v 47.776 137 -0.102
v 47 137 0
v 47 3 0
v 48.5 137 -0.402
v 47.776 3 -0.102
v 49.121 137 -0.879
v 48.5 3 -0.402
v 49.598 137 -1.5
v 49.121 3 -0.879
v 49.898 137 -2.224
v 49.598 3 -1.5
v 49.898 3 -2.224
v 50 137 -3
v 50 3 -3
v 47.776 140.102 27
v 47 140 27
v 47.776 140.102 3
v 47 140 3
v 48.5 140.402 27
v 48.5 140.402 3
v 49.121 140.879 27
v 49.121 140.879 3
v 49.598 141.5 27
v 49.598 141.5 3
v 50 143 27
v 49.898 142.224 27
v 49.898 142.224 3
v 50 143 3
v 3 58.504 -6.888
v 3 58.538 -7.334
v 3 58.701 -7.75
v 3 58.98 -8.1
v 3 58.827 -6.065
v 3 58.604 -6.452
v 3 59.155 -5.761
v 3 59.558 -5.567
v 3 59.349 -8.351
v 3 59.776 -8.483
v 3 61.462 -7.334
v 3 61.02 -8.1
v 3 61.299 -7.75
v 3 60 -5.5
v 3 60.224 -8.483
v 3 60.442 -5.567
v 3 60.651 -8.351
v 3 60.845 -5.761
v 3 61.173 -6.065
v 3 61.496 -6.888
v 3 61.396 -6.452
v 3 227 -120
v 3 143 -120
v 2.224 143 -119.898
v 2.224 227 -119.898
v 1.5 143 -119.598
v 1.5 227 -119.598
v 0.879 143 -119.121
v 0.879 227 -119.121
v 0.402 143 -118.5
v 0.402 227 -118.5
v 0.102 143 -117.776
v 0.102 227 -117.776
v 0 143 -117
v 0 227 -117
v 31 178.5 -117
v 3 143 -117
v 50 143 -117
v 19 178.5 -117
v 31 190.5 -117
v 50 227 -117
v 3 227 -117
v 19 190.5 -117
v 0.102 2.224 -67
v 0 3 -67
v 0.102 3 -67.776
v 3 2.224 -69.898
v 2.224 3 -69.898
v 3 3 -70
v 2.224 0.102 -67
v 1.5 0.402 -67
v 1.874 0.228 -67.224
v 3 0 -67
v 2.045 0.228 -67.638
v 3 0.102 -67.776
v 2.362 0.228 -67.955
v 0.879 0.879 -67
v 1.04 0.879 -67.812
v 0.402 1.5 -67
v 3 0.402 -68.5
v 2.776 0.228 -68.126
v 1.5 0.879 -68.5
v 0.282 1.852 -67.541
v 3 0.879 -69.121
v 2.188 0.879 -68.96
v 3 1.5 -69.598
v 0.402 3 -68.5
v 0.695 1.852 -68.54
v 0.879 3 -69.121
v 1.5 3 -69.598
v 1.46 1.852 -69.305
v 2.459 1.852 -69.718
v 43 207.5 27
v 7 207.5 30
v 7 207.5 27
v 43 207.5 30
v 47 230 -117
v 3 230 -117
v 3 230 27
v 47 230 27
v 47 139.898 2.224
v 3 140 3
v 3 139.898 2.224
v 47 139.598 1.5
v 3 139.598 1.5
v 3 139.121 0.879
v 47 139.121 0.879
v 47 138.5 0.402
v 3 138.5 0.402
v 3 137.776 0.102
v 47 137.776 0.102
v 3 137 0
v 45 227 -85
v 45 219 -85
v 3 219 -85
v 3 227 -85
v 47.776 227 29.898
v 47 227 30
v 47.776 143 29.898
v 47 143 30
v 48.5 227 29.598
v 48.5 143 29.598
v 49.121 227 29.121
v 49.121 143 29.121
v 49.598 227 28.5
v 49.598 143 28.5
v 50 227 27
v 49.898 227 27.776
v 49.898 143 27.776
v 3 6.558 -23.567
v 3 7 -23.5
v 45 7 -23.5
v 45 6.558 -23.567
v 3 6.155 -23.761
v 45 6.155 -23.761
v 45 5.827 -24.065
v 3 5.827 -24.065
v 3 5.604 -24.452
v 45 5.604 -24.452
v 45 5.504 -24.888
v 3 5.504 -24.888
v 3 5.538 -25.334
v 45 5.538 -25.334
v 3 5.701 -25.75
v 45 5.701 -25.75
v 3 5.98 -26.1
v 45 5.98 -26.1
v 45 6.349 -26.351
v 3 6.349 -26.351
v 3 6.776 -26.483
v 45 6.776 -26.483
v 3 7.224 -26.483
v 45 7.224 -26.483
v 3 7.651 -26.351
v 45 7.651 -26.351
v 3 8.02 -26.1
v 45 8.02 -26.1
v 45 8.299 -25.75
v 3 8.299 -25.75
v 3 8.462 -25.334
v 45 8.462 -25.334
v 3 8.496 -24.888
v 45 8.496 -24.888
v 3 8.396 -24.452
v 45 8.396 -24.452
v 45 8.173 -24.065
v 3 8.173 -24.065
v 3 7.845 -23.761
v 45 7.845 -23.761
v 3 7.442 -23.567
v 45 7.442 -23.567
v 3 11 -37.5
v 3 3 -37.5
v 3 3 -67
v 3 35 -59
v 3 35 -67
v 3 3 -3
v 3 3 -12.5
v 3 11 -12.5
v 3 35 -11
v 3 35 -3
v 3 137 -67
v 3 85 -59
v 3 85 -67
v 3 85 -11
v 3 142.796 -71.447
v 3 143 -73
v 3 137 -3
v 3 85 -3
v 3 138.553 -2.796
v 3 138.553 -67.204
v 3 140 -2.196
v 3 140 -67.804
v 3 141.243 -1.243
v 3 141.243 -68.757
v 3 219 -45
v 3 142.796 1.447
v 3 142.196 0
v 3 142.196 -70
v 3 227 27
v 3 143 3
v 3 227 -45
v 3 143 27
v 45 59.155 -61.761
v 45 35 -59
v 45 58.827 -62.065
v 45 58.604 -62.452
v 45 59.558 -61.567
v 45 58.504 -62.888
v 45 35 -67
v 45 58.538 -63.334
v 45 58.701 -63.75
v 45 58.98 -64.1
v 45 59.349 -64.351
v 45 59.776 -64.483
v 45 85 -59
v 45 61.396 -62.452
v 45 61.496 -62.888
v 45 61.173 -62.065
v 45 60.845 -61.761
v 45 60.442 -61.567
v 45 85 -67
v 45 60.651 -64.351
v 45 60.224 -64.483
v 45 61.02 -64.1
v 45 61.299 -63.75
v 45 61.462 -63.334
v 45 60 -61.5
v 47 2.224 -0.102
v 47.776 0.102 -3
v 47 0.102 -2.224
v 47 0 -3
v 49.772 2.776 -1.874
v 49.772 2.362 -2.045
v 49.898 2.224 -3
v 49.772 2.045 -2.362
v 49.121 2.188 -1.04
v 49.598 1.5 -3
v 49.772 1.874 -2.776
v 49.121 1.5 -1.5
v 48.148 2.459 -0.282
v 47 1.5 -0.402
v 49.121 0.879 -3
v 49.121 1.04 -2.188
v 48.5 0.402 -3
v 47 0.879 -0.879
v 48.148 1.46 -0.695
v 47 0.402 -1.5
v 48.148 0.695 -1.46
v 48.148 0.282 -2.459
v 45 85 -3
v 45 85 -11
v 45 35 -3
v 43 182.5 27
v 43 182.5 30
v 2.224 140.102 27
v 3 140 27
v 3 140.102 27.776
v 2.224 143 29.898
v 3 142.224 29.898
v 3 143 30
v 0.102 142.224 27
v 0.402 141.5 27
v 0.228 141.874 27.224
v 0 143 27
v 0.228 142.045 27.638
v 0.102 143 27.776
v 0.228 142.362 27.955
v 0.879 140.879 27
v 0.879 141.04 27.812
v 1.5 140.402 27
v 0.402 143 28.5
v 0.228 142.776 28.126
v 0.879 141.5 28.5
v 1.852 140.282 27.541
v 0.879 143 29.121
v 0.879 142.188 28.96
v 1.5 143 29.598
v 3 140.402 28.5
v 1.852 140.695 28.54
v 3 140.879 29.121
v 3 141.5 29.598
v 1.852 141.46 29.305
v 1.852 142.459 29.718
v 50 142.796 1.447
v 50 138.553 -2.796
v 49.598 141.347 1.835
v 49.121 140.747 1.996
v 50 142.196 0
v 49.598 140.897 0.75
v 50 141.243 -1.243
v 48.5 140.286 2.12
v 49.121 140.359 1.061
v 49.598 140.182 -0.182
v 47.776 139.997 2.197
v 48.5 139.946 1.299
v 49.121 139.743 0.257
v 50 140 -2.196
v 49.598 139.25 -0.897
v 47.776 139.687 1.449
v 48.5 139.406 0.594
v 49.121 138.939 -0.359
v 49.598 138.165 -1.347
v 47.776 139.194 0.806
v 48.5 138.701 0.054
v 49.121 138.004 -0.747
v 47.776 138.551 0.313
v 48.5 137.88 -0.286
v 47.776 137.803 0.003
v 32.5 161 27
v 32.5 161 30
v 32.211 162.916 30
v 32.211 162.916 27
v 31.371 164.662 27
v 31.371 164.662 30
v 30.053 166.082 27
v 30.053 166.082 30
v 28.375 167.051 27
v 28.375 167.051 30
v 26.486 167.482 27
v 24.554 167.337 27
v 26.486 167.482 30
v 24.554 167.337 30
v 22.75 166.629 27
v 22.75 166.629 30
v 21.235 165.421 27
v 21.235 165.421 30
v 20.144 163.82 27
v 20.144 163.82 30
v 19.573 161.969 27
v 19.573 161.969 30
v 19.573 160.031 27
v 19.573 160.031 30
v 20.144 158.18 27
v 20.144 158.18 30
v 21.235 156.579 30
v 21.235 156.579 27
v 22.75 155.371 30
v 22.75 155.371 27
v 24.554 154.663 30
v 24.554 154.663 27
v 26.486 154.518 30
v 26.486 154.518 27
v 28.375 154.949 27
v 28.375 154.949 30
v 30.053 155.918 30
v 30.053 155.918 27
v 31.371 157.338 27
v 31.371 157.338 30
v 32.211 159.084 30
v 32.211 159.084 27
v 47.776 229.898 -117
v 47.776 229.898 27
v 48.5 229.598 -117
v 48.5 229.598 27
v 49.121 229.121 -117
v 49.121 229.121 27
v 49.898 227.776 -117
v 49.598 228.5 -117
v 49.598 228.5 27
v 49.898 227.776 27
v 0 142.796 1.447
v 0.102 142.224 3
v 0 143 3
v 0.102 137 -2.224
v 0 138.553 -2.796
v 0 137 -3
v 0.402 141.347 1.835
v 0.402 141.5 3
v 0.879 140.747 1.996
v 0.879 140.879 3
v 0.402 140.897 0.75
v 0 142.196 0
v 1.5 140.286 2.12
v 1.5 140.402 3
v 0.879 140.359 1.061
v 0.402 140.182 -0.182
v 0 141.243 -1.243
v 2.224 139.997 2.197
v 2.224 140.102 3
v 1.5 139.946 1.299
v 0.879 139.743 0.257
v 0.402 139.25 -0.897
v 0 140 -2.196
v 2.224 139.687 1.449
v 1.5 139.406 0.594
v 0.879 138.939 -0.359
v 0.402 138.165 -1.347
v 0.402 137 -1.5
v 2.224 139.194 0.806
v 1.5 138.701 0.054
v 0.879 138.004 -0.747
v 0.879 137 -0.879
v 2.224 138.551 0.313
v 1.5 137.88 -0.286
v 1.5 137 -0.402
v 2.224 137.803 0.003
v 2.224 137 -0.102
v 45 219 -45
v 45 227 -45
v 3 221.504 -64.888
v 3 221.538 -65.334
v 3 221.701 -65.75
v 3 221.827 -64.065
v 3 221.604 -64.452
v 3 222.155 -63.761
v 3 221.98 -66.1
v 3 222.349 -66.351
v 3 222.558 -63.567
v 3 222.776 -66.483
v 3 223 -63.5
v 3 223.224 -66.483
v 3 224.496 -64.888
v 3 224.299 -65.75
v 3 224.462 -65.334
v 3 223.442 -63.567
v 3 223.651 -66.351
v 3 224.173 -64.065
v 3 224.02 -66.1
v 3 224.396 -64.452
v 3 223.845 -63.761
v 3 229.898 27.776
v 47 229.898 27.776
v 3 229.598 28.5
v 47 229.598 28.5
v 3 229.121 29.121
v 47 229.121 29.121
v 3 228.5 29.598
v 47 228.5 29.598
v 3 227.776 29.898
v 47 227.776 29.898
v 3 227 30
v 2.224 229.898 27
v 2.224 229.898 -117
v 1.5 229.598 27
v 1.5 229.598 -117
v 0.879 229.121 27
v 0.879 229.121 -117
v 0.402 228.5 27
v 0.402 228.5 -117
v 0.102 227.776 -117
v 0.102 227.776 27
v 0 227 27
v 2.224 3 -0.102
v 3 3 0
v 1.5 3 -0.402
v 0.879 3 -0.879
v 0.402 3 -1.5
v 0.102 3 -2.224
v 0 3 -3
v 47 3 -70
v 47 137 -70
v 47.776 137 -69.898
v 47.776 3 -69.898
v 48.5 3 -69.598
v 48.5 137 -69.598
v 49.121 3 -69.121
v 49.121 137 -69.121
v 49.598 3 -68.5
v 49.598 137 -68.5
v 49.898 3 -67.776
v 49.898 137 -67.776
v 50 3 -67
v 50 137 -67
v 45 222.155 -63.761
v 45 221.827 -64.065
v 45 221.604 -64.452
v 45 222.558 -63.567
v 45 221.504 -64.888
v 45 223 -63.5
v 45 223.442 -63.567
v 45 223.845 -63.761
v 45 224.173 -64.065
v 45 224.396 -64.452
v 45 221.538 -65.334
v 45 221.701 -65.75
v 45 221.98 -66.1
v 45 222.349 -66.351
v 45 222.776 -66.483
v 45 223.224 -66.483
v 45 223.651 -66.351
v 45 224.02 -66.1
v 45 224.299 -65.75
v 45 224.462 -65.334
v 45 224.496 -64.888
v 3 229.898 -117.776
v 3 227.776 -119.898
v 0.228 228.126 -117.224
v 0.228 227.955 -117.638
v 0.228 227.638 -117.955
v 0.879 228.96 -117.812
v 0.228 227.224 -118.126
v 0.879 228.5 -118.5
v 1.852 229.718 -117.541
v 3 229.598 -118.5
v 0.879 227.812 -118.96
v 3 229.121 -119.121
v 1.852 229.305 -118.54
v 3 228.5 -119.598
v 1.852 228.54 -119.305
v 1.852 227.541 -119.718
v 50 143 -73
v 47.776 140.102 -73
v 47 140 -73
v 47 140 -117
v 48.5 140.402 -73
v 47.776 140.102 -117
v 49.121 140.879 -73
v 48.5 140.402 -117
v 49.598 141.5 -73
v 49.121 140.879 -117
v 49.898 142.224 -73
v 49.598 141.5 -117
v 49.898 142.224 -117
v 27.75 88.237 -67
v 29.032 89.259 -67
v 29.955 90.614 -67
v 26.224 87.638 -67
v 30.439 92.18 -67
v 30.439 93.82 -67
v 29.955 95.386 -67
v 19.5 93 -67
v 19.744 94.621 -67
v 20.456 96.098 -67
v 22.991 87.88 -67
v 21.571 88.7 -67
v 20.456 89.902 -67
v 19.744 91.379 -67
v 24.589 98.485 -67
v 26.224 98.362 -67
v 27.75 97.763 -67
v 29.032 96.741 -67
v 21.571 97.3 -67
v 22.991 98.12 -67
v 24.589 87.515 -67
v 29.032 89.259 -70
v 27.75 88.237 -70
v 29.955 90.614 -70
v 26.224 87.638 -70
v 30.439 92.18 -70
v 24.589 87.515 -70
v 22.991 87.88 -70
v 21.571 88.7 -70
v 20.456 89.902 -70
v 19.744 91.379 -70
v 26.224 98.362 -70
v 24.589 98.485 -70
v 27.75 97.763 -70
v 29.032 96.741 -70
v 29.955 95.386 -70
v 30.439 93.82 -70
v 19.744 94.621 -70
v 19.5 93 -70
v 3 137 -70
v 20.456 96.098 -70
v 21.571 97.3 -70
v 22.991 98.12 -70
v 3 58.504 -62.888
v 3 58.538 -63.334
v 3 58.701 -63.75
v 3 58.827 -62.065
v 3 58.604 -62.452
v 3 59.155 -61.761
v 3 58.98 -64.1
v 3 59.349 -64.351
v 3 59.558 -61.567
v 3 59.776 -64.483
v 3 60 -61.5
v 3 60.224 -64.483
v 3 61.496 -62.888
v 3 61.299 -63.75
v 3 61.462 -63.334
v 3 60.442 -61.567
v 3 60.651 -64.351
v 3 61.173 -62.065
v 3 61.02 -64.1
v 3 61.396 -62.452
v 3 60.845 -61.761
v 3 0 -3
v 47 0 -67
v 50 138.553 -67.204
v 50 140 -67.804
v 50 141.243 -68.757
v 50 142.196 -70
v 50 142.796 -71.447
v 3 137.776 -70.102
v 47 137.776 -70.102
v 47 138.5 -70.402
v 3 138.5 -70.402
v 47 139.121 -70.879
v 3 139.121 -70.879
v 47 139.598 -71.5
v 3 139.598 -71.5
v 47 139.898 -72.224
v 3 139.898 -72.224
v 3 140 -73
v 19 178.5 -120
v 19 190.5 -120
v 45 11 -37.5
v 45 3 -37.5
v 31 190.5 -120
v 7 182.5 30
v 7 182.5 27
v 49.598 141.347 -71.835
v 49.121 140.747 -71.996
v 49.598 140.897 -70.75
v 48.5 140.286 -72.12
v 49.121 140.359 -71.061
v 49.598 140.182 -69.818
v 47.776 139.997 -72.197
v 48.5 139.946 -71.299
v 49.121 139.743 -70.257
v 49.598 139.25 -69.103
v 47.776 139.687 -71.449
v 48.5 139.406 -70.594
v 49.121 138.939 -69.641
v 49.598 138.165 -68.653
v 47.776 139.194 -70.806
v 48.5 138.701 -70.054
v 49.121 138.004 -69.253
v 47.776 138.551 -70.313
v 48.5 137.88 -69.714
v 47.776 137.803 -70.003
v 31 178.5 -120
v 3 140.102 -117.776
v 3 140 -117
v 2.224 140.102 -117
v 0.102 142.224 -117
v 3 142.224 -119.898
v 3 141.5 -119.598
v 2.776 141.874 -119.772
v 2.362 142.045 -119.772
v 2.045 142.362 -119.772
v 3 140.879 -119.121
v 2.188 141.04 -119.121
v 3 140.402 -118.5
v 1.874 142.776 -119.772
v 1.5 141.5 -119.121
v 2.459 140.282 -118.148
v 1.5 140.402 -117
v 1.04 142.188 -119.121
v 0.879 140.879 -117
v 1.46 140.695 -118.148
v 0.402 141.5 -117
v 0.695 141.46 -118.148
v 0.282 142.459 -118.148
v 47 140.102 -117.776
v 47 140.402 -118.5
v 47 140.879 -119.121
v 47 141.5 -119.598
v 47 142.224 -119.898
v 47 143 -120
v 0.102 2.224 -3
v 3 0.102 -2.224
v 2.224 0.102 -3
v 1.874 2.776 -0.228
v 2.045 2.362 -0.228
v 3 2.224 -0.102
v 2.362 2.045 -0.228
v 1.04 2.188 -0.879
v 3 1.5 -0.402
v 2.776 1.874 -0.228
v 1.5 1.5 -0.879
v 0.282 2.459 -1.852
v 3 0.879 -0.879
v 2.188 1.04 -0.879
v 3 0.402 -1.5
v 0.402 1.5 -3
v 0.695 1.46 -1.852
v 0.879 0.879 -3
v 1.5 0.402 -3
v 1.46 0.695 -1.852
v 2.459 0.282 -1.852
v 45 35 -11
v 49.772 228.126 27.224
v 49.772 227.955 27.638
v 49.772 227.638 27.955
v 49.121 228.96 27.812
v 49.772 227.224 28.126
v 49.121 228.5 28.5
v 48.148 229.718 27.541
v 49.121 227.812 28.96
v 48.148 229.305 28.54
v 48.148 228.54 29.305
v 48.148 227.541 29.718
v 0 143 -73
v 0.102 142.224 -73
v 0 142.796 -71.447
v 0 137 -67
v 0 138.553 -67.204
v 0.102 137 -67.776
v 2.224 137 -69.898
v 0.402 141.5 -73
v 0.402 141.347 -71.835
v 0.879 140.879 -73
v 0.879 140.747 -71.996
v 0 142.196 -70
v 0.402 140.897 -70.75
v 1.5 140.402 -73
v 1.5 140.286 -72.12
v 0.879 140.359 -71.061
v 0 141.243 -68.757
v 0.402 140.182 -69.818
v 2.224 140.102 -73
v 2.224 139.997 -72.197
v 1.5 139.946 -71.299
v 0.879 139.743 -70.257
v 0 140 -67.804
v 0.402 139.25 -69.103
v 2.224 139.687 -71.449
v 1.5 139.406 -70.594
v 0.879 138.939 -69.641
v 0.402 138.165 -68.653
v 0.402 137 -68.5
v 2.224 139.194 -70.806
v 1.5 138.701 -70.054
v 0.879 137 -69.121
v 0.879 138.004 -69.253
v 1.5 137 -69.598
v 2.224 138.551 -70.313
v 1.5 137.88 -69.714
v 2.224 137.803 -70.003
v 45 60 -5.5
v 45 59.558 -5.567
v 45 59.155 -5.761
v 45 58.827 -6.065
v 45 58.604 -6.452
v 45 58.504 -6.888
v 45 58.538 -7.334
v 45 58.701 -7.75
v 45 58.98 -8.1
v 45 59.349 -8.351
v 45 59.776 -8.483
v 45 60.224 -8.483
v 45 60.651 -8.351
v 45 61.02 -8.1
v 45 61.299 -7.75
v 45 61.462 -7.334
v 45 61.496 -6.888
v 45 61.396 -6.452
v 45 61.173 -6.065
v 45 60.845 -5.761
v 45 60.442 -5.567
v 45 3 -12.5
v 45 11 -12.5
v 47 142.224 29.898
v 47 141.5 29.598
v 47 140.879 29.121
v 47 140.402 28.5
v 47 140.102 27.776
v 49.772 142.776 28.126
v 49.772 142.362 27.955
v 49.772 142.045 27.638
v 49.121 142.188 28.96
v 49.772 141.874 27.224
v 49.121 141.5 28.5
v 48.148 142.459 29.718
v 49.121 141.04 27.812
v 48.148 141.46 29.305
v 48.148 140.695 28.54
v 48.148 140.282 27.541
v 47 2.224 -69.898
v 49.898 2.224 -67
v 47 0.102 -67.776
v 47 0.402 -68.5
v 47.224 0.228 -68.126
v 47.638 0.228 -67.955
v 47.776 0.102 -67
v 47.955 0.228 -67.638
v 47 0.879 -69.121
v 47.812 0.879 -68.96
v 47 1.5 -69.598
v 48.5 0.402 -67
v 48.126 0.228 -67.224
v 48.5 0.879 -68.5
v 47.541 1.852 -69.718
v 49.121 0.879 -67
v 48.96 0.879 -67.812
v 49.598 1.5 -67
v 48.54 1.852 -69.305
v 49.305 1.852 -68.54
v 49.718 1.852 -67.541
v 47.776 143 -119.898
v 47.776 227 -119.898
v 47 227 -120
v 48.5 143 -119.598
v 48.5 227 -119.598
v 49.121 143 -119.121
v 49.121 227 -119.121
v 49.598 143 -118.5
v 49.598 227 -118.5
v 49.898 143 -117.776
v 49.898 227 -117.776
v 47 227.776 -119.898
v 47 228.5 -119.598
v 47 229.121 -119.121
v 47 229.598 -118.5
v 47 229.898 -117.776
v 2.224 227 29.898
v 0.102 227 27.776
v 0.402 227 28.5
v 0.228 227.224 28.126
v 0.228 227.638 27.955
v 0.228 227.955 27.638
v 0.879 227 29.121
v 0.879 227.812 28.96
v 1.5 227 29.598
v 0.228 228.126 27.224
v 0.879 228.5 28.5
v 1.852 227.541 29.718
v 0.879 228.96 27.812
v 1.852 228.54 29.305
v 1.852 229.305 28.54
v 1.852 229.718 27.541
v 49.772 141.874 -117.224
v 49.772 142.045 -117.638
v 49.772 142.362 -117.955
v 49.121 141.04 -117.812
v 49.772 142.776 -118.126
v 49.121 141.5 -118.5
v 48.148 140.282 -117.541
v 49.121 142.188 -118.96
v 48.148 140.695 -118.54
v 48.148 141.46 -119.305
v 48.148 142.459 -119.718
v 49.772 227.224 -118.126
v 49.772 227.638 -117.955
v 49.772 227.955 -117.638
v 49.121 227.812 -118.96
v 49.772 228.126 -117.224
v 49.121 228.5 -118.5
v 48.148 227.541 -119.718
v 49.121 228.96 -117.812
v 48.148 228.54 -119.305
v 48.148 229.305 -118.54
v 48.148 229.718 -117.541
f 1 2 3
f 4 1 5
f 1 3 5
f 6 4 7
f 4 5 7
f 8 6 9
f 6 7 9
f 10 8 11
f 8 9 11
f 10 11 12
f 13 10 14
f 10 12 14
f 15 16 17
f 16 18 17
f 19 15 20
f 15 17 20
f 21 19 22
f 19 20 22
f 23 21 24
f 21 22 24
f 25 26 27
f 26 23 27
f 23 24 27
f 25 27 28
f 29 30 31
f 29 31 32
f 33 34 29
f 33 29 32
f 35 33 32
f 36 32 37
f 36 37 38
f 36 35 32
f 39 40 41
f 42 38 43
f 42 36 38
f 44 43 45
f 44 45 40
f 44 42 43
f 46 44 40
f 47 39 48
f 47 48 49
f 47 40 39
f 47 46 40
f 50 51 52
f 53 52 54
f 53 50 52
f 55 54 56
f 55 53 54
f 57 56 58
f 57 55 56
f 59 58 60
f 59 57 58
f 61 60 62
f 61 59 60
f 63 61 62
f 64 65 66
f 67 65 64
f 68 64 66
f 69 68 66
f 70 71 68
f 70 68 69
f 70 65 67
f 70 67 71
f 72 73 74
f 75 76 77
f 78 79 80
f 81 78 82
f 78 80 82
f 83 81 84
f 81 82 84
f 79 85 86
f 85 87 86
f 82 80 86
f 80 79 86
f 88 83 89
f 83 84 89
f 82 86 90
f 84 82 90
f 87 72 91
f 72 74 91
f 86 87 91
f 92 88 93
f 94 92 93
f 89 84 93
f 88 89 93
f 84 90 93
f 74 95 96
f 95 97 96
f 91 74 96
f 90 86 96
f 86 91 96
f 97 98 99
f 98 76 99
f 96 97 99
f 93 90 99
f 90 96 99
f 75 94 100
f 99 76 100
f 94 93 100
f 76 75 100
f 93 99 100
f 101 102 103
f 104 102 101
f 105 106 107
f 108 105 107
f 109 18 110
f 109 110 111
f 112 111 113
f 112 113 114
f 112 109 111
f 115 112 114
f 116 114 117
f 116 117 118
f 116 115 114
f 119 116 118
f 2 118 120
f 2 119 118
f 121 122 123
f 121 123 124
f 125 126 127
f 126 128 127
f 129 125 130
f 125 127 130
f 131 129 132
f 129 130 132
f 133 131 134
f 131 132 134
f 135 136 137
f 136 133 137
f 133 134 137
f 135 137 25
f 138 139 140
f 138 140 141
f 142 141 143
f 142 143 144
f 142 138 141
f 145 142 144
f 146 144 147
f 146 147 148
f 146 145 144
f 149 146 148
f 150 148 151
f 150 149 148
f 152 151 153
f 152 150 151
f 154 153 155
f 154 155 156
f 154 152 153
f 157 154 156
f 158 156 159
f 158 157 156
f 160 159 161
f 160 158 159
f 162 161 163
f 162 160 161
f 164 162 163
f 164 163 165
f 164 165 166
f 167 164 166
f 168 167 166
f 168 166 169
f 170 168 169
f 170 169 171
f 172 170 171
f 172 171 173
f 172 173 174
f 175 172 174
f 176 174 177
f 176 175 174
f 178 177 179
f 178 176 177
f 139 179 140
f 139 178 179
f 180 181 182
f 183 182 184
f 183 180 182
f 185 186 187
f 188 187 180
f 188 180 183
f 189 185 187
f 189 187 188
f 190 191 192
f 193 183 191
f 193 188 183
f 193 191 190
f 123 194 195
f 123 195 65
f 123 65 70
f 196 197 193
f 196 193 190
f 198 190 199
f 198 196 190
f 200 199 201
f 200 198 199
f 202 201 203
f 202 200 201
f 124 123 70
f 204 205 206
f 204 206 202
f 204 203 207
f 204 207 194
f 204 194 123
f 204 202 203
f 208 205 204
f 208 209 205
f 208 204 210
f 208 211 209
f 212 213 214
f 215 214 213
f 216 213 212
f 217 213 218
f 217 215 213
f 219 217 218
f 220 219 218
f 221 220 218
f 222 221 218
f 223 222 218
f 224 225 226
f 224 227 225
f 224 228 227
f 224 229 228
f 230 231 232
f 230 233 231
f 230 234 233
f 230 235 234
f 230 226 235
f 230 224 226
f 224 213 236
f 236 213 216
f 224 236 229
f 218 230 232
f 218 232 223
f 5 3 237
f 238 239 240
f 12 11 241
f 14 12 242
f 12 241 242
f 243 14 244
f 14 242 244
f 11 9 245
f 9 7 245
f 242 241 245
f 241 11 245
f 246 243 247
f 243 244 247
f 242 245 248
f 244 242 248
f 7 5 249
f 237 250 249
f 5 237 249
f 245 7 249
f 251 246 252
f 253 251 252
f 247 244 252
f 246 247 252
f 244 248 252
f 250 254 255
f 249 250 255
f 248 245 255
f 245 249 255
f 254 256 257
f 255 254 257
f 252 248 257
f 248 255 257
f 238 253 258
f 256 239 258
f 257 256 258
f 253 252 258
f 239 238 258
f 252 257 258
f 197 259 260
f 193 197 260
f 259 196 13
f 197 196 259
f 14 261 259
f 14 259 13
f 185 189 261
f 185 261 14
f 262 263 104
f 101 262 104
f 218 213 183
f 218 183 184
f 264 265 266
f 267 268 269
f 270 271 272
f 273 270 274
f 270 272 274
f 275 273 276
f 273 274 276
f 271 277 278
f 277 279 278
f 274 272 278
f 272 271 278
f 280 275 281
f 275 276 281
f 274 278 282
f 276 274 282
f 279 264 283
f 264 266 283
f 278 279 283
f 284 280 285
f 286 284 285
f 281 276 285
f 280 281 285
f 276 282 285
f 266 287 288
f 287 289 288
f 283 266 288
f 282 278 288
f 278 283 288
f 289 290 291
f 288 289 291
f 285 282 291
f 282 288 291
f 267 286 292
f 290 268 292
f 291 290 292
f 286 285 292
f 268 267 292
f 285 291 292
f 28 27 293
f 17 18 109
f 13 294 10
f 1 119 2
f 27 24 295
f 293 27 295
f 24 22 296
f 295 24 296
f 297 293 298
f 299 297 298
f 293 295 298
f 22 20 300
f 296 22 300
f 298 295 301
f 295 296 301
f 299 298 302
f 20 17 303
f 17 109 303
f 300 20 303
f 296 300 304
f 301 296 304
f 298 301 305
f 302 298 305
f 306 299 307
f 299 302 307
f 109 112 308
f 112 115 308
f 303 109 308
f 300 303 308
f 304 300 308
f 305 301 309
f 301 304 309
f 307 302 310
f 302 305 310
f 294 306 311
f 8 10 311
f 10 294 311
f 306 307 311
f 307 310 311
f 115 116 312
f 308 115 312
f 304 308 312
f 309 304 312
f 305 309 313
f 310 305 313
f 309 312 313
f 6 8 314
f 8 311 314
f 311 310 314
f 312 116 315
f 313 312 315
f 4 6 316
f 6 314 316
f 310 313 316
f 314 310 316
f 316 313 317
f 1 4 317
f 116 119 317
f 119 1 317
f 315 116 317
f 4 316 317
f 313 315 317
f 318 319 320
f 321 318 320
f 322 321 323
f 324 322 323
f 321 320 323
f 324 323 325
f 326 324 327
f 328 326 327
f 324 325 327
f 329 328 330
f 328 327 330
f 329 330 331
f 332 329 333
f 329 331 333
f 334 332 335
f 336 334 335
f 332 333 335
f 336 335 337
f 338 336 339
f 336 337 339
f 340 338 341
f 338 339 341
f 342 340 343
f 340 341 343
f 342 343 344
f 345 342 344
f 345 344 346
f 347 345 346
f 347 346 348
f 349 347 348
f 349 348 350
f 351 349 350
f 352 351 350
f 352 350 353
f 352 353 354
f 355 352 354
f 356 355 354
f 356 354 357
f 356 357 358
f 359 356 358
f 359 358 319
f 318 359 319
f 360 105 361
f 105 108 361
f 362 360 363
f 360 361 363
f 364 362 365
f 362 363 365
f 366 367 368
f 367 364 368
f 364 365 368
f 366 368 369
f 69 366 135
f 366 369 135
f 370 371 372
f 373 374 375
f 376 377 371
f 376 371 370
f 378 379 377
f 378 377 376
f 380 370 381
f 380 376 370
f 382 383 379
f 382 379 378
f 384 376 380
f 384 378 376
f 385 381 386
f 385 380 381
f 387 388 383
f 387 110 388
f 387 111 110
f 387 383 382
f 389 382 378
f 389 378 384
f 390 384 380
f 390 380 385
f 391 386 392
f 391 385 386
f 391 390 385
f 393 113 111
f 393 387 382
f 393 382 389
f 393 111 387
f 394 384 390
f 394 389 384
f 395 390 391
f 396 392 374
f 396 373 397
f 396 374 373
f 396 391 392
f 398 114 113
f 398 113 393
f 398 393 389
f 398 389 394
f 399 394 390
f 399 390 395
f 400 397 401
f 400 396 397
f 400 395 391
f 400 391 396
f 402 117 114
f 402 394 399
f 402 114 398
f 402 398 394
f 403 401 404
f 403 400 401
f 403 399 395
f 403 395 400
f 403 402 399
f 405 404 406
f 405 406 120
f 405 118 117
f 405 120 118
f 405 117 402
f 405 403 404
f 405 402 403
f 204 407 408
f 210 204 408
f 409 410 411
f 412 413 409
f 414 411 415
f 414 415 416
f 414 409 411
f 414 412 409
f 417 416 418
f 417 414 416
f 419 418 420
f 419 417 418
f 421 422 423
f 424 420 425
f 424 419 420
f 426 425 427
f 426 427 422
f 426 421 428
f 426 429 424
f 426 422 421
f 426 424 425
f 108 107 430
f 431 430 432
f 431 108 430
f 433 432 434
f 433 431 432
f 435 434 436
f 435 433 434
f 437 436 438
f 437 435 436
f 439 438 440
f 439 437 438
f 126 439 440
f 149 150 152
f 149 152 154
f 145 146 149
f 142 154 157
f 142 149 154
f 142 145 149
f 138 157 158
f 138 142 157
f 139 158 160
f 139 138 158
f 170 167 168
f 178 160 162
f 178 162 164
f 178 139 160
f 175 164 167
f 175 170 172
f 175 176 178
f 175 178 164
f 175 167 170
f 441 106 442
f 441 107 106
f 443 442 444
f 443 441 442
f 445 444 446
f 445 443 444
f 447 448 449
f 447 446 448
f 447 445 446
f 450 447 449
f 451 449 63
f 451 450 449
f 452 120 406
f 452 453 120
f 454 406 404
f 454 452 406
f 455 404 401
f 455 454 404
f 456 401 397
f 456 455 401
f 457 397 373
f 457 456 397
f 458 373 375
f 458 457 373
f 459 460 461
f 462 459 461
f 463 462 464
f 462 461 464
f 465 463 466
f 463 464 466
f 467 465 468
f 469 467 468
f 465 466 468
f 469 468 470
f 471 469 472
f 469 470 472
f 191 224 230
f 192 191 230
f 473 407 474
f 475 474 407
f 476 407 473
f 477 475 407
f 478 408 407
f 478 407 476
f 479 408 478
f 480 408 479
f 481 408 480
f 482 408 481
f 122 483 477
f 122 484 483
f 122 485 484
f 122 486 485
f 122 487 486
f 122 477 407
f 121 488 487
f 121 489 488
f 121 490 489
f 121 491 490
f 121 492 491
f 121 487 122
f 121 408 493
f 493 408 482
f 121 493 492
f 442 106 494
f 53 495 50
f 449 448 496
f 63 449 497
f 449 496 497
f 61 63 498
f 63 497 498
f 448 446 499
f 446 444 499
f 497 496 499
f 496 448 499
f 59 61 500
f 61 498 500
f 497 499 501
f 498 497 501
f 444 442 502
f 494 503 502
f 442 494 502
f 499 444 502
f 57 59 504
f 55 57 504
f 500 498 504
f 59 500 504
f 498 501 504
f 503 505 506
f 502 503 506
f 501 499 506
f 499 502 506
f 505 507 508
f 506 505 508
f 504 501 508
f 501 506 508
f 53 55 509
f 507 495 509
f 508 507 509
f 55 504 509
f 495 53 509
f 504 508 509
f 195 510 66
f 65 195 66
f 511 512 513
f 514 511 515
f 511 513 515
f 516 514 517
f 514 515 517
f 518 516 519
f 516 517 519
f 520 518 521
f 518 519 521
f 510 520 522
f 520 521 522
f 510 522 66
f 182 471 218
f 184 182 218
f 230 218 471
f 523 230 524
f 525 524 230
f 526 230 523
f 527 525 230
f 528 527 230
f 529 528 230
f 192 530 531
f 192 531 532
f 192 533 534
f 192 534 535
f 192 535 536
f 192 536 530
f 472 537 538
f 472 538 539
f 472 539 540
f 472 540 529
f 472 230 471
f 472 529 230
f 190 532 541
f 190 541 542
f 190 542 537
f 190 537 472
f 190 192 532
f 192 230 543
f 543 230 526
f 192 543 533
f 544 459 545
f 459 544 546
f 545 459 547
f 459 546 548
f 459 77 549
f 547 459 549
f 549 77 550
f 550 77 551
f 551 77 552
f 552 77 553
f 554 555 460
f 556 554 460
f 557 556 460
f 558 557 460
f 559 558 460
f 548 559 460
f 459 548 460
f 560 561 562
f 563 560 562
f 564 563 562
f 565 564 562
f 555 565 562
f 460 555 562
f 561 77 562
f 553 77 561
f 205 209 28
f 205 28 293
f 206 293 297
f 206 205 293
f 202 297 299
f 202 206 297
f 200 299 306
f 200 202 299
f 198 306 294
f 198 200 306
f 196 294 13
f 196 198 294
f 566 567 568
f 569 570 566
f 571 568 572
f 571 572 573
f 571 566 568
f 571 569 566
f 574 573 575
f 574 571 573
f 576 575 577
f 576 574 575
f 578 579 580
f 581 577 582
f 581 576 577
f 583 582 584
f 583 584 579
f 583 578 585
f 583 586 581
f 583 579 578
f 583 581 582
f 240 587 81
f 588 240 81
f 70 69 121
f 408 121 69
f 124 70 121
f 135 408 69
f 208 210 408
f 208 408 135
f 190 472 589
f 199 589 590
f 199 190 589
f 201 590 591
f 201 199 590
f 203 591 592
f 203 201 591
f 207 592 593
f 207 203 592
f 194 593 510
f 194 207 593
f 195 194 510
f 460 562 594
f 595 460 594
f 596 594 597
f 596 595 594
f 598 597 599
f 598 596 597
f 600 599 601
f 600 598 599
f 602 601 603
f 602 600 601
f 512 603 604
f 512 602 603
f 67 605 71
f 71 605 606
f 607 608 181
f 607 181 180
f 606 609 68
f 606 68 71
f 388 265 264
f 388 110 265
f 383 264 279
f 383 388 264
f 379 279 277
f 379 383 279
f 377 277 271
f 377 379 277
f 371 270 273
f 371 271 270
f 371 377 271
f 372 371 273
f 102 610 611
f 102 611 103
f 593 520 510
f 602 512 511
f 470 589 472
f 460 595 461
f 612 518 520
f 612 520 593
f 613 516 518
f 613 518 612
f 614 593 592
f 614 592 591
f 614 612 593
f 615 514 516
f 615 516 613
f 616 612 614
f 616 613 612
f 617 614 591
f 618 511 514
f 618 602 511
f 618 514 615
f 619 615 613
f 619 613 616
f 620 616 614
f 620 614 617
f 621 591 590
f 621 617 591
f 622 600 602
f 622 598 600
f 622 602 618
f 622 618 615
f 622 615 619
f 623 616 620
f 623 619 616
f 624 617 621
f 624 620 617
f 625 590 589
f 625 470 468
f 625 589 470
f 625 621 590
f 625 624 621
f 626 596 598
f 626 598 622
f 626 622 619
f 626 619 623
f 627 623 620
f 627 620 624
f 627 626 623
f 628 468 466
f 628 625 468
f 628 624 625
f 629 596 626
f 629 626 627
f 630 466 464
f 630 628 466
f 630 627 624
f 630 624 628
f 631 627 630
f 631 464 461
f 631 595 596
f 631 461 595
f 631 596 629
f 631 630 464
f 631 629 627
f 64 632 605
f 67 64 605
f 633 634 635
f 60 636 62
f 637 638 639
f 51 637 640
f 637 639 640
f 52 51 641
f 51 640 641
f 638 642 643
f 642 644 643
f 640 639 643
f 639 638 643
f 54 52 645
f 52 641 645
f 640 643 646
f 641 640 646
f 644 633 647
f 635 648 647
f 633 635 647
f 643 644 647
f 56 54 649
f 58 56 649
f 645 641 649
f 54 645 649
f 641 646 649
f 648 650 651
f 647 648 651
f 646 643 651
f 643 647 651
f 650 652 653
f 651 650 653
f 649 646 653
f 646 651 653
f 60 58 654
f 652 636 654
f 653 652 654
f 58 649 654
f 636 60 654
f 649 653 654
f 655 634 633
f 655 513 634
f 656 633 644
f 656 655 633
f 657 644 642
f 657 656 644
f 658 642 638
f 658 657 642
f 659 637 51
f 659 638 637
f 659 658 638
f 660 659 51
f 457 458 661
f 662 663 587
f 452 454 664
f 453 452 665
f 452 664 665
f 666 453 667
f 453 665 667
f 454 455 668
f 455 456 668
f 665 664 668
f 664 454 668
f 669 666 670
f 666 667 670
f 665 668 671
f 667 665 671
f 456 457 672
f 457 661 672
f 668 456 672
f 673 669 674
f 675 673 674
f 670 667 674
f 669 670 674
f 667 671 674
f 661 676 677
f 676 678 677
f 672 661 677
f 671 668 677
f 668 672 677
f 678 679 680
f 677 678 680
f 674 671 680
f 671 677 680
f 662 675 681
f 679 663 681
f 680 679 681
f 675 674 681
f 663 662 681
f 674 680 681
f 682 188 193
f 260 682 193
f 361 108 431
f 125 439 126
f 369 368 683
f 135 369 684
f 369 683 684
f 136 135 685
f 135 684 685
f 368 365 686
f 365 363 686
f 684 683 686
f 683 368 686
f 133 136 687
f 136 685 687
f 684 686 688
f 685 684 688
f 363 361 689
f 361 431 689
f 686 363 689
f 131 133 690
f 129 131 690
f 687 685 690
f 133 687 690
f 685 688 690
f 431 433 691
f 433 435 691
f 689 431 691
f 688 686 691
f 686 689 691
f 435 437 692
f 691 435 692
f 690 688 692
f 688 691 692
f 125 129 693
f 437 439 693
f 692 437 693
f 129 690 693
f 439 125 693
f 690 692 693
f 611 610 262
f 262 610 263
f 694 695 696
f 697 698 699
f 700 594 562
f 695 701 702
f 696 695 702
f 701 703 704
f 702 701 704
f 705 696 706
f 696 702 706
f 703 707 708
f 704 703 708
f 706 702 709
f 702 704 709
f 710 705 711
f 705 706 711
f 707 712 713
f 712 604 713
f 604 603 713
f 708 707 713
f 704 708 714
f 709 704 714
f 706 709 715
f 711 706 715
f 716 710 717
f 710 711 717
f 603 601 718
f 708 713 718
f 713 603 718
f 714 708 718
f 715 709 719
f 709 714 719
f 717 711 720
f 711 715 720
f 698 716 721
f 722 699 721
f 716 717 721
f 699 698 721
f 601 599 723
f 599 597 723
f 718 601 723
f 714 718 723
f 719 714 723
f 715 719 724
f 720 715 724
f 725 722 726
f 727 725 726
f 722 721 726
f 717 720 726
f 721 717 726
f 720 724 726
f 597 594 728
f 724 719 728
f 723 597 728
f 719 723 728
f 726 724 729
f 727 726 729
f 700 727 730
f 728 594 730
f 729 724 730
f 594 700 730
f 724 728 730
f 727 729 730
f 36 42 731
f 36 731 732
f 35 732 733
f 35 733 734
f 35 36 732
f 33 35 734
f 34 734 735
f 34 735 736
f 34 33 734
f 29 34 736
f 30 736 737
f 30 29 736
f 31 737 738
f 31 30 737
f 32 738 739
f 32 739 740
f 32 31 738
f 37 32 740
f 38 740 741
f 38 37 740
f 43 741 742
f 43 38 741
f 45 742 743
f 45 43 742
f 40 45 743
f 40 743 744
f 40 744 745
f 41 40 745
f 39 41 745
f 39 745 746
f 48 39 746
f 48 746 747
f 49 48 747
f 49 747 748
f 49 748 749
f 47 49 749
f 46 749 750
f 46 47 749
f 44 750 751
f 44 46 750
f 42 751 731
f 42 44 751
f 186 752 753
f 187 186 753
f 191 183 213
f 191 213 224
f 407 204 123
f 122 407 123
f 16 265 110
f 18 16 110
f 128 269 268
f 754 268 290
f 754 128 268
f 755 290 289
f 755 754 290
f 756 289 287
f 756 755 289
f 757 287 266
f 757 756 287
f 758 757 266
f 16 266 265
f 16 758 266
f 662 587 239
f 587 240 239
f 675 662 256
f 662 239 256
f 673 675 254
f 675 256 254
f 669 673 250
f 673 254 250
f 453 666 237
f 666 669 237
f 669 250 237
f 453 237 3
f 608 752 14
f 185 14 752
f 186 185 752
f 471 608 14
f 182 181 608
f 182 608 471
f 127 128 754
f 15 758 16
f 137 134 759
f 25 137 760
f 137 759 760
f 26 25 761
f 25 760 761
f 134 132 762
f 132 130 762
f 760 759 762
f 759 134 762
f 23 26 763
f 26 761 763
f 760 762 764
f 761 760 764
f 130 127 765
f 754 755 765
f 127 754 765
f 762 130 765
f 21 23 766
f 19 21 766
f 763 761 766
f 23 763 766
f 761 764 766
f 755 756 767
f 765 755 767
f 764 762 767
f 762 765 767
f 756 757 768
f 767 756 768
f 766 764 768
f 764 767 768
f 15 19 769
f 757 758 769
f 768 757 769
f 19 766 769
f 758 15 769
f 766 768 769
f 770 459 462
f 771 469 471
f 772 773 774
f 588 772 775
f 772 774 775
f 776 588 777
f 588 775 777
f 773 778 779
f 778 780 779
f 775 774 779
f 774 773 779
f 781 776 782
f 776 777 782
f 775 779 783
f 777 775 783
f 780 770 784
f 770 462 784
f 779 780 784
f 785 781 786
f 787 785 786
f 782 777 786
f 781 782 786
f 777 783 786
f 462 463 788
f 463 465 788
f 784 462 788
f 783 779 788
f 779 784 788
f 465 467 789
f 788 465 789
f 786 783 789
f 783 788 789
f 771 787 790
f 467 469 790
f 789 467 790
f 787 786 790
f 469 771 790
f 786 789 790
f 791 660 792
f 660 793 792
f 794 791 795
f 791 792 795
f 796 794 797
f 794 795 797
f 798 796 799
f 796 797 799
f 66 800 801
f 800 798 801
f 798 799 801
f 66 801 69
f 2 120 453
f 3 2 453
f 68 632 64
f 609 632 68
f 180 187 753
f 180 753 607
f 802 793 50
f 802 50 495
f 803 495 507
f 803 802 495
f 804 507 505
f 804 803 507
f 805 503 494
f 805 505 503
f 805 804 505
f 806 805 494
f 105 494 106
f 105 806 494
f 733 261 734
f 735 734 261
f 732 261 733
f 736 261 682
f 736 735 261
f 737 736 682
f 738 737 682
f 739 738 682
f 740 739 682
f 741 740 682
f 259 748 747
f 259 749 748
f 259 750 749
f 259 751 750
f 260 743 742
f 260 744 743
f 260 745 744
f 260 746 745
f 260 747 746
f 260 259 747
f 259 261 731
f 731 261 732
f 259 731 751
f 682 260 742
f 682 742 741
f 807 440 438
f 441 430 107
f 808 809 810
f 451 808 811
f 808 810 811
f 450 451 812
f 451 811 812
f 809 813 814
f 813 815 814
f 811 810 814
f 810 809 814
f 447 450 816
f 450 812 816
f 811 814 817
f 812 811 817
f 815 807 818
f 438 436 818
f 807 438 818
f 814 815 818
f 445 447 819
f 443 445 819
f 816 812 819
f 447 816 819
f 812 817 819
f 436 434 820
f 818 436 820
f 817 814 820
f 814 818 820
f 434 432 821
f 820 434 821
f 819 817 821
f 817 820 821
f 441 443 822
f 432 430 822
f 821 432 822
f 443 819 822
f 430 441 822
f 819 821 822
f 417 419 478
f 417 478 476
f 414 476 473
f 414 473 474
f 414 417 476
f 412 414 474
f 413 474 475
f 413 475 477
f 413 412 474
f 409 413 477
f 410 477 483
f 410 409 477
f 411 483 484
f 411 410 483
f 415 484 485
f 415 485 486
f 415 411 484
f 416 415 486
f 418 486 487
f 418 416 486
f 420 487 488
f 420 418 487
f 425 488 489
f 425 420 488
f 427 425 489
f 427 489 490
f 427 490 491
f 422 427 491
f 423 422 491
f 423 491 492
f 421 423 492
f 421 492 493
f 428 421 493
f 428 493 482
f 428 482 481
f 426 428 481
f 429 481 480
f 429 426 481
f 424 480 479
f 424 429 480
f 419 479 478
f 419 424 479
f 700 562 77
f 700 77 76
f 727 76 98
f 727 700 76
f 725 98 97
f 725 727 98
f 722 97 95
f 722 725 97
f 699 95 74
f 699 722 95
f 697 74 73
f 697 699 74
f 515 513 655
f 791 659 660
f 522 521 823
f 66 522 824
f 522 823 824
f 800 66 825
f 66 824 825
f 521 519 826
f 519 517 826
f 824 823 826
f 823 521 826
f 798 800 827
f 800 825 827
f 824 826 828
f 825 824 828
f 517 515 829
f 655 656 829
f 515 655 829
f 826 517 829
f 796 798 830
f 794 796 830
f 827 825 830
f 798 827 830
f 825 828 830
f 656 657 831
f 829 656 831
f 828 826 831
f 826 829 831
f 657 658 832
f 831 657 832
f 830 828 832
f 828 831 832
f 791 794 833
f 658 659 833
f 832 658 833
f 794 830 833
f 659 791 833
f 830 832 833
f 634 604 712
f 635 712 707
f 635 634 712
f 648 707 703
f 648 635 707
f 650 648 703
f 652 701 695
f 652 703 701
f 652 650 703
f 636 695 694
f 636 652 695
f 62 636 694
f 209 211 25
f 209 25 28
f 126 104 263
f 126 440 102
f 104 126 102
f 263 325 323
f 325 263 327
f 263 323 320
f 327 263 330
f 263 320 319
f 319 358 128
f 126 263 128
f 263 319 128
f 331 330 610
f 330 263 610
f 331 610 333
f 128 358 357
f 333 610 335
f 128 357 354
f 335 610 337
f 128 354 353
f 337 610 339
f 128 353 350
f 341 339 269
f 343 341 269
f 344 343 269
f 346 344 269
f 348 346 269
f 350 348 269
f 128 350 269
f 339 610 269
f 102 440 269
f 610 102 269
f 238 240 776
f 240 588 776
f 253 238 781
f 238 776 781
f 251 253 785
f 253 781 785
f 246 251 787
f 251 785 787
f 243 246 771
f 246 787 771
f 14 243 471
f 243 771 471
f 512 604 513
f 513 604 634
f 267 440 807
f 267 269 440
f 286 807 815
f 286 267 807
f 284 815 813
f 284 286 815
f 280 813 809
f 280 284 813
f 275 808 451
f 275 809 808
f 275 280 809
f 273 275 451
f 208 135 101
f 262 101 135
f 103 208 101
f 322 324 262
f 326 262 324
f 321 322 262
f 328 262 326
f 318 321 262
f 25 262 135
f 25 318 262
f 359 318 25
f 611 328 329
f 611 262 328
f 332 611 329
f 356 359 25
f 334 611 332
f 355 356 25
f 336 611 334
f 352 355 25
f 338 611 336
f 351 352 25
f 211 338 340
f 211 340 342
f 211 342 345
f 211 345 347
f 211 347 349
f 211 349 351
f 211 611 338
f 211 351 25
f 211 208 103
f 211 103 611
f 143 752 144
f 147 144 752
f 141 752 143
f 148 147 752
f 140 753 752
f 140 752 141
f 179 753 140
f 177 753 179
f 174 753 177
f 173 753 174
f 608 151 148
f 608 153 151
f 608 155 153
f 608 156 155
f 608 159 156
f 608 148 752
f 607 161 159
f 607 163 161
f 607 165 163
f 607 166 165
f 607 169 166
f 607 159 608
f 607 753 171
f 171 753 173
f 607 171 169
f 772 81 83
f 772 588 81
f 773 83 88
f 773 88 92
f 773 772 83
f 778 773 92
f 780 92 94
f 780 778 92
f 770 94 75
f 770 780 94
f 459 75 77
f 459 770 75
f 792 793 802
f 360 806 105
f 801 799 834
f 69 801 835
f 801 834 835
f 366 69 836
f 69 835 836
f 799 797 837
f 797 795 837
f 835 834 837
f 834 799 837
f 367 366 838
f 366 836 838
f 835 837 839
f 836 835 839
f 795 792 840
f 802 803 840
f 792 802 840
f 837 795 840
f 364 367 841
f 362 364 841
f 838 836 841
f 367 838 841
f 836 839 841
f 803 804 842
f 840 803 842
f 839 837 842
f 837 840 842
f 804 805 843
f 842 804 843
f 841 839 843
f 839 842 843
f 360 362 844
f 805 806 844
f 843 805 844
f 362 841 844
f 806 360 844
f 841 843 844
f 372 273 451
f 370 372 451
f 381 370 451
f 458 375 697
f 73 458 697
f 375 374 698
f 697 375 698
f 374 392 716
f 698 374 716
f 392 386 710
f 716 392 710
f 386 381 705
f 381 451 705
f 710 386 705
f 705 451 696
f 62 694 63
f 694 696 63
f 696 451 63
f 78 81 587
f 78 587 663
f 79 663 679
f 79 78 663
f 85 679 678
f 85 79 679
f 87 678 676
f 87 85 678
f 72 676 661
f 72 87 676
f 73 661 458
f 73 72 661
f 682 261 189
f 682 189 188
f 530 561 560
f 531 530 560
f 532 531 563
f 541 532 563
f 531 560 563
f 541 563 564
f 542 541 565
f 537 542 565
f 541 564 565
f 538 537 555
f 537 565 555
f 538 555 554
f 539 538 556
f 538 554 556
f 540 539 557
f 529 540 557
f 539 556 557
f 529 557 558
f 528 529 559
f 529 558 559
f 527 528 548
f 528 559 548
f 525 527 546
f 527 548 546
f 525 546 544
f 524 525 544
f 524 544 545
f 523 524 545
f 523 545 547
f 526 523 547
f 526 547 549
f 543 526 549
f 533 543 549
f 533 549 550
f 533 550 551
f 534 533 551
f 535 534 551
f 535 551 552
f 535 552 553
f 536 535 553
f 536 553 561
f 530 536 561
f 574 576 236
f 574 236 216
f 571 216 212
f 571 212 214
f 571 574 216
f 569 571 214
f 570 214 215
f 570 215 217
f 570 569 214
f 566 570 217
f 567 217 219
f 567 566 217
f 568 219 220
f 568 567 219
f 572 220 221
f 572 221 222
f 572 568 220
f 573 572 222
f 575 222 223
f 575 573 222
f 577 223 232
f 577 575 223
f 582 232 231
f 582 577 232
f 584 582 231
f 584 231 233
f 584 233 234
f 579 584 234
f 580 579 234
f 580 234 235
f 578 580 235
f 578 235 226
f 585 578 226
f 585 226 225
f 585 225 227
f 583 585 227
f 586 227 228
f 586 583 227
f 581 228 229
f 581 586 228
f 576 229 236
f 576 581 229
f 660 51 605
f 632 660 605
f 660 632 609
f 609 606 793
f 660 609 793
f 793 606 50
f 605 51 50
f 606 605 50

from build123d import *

# Parameters (mm, degrees)
BOSS_EXTRU_1_DEPTH      = 50
CONG_1_R                = 3
COQUE2_START            = 3
COQUE2_DEPTH            = 47
ESQUISSE2_W             = 40
ESQUISSE2_H             = 8
ESQUISSE2_R             = 1.5
ESQUISSE2_W_2           = 8
ESQUISSE2_H_2           = 50
ESQUISSE2_W_3           = 25
BOSS_EXTRU_3_DEPTH      = 42
ESQUISSE3_W             = 36
ESQUISSE3_H             = 25
ENL_V_MAT_EXTRU_1_DEPTH = 10
ESQUISSE5_R             = 6.5
ENL_V_MAT_EXTRU_2_DEPTH = 10
ESQUISSE6_R             = 5.5
ENL_V_MAT_EXTRU_3_DEPTH = 10
ESQUISSE7_W             = 12
ESQUISSE7_H             = 12
ENL_V_MAT_EXTRU_4_DEPTH = 10


# Read off the part's stored shape, not the designer's step: Coque2
with BuildPart() as part:
    # Esquisse1 → Boss.-Extru.1 (new body)
    with BuildSketch(Plane(origin=(0, 0, 0), x_dir=(0, 0, -1), z_dir=(1, 0, 0))):
        Polygon((0, 0), (70, 0), (70, 140), (120, 140), (120, 230), (-30, 230), (-30, 140), (0, 140), align=None)
    extrude(amount=BOSS_EXTRU_1_DEPTH)

    # Congé1
    cong_1_edges = [part.edges().sort_by_distance(p)[0] for p in [
        (0, 140, -95),
        (0, 70, -70),
        (0, 0, -35),
        (0, 70, 0),
        (50, 70, -70),
        (25, 140, 0),
        (25, 140, 30),
        (25, 230, 30),
        (25, 230, -120),
        (25, 140, -120),
        (25, 140, -70),
        (25, 0, -70),
        (25, 0, 0),
        (50, 140, -95),
        (50, 185, -120),
        (50, 230, -45),
        (50, 185, 30),
        (50, 140, 15),
        (50, 70, 0),
        (0, 140, 15),
        (50, 0, -35),
        (0, 185, 30),
        (0, 230, -45),
        (0, 185, -120),
    ]]
    fillet(cong_1_edges, radius=CONG_1_R)

    # Coque2 outline → Coque2 (cut)
    with BuildSketch(Plane.YZ.offset(COQUE2_START)):
        with BuildLine():
            Line((137, -3), (3, -3))
            Line((3, -3), (3, -67))
            Line((3, -67), (137, -67))
            ThreePointArc((137, -67), (141.242640687, -68.757359313), (143, -73))
            Line((143, -73), (143, -117))
            Line((143, -117), (227, -117))
            Line((227, -117), (227, 27))
            Line((227, 27), (143, 27))
            Line((143, 27), (143, 3))
            ThreePointArc((143, 3), (141.242640687, -1.242640687), (137, -3))
        make_face()
    extrude(amount=COQUE2_DEPTH, mode=Mode.SUBTRACT)

    # Esquisse2 → Boss.-Extru.3 (add)
    # profile 1 of 4: a face of its own
    with BuildSketch(Plane(origin=(3, 0, 0), x_dir=(0, 0, -1), z_dir=(1, 0, 0))):
        with Locations((65, 223)):
            Rectangle(ESQUISSE2_W, ESQUISSE2_H)
        with Locations(Location((65, 223, 0), (0, 0, 180))):
            Circle(ESQUISSE2_R, mode=Mode.SUBTRACT)
    # profile 2 of 4: a face of its own
    with BuildSketch(Plane(origin=(3, 0, 0), x_dir=(0, 0, -1), z_dir=(1, 0, 0))):
        with Locations((7, 60)):
            Rectangle(ESQUISSE2_W_2, ESQUISSE2_H_2)
        with Locations(Location((7, 60, 0), (0, 0, 180))):
            Circle(ESQUISSE2_R, mode=Mode.SUBTRACT)
    # profile 3 of 4: a face of its own
    with BuildSketch(Plane(origin=(3, 0, 0), x_dir=(0, 0, -1), z_dir=(1, 0, 0))):
        with Locations((63, 60)):
            Rectangle(ESQUISSE2_W_2, ESQUISSE2_H_2)
        with Locations(Location((63, 60, 0), (0, 0, 180))):
            Circle(ESQUISSE2_R, mode=Mode.SUBTRACT)
    # profile 4 of 4: a face of its own
    with BuildSketch(Plane(origin=(3, 0, 0), x_dir=(0, 0, -1), z_dir=(1, 0, 0))):
        with Locations((25, 7)):
            Rectangle(ESQUISSE2_W_3, ESQUISSE2_H)
        with Locations(Location((25, 7, 0), (0, 0, 180))):
            Circle(ESQUISSE2_R, mode=Mode.SUBTRACT)
    extrude(amount=BOSS_EXTRU_3_DEPTH)

    # Esquisse3 → Enlèv. mat.-Extru.1 (cut)
    with BuildSketch(Plane.XY.offset(30)):
        with Locations((25, 195)):
            Rectangle(ESQUISSE3_W, ESQUISSE3_H)
    extrude(amount=-ENL_V_MAT_EXTRU_1_DEPTH, mode=Mode.SUBTRACT)

    # Esquisse5 → Enlèv. mat.-Extru.2 (cut)
    with BuildSketch(Plane.XY.offset(30)):
        with Locations((26, 161)):
            Circle(ESQUISSE5_R)
    extrude(amount=-ENL_V_MAT_EXTRU_2_DEPTH, mode=Mode.SUBTRACT)

    # Esquisse6 → Enlèv. mat.-Extru.3 (cut)
    with BuildSketch(Plane(origin=(0, 0, -70), x_dir=(-1, 0, 0), z_dir=(0, 0, -1))):
        with Locations((-25, 93)):
            Circle(ESQUISSE6_R)
    extrude(amount=-ENL_V_MAT_EXTRU_3_DEPTH, mode=Mode.SUBTRACT)

    # Esquisse7 → Enlèv. mat.-Extru.4 (cut)
    with BuildSketch(Plane(origin=(0, 0, -120), x_dir=(-1, 0, 0), z_dir=(0, 0, -1))):
        with Locations((-25, 184.5)):
            Rectangle(ESQUISSE7_W, ESQUISSE7_H)
    extrude(amount=-ENL_V_MAT_EXTRU_4_DEPTH, mode=Mode.SUBTRACT)


solid = part.part
